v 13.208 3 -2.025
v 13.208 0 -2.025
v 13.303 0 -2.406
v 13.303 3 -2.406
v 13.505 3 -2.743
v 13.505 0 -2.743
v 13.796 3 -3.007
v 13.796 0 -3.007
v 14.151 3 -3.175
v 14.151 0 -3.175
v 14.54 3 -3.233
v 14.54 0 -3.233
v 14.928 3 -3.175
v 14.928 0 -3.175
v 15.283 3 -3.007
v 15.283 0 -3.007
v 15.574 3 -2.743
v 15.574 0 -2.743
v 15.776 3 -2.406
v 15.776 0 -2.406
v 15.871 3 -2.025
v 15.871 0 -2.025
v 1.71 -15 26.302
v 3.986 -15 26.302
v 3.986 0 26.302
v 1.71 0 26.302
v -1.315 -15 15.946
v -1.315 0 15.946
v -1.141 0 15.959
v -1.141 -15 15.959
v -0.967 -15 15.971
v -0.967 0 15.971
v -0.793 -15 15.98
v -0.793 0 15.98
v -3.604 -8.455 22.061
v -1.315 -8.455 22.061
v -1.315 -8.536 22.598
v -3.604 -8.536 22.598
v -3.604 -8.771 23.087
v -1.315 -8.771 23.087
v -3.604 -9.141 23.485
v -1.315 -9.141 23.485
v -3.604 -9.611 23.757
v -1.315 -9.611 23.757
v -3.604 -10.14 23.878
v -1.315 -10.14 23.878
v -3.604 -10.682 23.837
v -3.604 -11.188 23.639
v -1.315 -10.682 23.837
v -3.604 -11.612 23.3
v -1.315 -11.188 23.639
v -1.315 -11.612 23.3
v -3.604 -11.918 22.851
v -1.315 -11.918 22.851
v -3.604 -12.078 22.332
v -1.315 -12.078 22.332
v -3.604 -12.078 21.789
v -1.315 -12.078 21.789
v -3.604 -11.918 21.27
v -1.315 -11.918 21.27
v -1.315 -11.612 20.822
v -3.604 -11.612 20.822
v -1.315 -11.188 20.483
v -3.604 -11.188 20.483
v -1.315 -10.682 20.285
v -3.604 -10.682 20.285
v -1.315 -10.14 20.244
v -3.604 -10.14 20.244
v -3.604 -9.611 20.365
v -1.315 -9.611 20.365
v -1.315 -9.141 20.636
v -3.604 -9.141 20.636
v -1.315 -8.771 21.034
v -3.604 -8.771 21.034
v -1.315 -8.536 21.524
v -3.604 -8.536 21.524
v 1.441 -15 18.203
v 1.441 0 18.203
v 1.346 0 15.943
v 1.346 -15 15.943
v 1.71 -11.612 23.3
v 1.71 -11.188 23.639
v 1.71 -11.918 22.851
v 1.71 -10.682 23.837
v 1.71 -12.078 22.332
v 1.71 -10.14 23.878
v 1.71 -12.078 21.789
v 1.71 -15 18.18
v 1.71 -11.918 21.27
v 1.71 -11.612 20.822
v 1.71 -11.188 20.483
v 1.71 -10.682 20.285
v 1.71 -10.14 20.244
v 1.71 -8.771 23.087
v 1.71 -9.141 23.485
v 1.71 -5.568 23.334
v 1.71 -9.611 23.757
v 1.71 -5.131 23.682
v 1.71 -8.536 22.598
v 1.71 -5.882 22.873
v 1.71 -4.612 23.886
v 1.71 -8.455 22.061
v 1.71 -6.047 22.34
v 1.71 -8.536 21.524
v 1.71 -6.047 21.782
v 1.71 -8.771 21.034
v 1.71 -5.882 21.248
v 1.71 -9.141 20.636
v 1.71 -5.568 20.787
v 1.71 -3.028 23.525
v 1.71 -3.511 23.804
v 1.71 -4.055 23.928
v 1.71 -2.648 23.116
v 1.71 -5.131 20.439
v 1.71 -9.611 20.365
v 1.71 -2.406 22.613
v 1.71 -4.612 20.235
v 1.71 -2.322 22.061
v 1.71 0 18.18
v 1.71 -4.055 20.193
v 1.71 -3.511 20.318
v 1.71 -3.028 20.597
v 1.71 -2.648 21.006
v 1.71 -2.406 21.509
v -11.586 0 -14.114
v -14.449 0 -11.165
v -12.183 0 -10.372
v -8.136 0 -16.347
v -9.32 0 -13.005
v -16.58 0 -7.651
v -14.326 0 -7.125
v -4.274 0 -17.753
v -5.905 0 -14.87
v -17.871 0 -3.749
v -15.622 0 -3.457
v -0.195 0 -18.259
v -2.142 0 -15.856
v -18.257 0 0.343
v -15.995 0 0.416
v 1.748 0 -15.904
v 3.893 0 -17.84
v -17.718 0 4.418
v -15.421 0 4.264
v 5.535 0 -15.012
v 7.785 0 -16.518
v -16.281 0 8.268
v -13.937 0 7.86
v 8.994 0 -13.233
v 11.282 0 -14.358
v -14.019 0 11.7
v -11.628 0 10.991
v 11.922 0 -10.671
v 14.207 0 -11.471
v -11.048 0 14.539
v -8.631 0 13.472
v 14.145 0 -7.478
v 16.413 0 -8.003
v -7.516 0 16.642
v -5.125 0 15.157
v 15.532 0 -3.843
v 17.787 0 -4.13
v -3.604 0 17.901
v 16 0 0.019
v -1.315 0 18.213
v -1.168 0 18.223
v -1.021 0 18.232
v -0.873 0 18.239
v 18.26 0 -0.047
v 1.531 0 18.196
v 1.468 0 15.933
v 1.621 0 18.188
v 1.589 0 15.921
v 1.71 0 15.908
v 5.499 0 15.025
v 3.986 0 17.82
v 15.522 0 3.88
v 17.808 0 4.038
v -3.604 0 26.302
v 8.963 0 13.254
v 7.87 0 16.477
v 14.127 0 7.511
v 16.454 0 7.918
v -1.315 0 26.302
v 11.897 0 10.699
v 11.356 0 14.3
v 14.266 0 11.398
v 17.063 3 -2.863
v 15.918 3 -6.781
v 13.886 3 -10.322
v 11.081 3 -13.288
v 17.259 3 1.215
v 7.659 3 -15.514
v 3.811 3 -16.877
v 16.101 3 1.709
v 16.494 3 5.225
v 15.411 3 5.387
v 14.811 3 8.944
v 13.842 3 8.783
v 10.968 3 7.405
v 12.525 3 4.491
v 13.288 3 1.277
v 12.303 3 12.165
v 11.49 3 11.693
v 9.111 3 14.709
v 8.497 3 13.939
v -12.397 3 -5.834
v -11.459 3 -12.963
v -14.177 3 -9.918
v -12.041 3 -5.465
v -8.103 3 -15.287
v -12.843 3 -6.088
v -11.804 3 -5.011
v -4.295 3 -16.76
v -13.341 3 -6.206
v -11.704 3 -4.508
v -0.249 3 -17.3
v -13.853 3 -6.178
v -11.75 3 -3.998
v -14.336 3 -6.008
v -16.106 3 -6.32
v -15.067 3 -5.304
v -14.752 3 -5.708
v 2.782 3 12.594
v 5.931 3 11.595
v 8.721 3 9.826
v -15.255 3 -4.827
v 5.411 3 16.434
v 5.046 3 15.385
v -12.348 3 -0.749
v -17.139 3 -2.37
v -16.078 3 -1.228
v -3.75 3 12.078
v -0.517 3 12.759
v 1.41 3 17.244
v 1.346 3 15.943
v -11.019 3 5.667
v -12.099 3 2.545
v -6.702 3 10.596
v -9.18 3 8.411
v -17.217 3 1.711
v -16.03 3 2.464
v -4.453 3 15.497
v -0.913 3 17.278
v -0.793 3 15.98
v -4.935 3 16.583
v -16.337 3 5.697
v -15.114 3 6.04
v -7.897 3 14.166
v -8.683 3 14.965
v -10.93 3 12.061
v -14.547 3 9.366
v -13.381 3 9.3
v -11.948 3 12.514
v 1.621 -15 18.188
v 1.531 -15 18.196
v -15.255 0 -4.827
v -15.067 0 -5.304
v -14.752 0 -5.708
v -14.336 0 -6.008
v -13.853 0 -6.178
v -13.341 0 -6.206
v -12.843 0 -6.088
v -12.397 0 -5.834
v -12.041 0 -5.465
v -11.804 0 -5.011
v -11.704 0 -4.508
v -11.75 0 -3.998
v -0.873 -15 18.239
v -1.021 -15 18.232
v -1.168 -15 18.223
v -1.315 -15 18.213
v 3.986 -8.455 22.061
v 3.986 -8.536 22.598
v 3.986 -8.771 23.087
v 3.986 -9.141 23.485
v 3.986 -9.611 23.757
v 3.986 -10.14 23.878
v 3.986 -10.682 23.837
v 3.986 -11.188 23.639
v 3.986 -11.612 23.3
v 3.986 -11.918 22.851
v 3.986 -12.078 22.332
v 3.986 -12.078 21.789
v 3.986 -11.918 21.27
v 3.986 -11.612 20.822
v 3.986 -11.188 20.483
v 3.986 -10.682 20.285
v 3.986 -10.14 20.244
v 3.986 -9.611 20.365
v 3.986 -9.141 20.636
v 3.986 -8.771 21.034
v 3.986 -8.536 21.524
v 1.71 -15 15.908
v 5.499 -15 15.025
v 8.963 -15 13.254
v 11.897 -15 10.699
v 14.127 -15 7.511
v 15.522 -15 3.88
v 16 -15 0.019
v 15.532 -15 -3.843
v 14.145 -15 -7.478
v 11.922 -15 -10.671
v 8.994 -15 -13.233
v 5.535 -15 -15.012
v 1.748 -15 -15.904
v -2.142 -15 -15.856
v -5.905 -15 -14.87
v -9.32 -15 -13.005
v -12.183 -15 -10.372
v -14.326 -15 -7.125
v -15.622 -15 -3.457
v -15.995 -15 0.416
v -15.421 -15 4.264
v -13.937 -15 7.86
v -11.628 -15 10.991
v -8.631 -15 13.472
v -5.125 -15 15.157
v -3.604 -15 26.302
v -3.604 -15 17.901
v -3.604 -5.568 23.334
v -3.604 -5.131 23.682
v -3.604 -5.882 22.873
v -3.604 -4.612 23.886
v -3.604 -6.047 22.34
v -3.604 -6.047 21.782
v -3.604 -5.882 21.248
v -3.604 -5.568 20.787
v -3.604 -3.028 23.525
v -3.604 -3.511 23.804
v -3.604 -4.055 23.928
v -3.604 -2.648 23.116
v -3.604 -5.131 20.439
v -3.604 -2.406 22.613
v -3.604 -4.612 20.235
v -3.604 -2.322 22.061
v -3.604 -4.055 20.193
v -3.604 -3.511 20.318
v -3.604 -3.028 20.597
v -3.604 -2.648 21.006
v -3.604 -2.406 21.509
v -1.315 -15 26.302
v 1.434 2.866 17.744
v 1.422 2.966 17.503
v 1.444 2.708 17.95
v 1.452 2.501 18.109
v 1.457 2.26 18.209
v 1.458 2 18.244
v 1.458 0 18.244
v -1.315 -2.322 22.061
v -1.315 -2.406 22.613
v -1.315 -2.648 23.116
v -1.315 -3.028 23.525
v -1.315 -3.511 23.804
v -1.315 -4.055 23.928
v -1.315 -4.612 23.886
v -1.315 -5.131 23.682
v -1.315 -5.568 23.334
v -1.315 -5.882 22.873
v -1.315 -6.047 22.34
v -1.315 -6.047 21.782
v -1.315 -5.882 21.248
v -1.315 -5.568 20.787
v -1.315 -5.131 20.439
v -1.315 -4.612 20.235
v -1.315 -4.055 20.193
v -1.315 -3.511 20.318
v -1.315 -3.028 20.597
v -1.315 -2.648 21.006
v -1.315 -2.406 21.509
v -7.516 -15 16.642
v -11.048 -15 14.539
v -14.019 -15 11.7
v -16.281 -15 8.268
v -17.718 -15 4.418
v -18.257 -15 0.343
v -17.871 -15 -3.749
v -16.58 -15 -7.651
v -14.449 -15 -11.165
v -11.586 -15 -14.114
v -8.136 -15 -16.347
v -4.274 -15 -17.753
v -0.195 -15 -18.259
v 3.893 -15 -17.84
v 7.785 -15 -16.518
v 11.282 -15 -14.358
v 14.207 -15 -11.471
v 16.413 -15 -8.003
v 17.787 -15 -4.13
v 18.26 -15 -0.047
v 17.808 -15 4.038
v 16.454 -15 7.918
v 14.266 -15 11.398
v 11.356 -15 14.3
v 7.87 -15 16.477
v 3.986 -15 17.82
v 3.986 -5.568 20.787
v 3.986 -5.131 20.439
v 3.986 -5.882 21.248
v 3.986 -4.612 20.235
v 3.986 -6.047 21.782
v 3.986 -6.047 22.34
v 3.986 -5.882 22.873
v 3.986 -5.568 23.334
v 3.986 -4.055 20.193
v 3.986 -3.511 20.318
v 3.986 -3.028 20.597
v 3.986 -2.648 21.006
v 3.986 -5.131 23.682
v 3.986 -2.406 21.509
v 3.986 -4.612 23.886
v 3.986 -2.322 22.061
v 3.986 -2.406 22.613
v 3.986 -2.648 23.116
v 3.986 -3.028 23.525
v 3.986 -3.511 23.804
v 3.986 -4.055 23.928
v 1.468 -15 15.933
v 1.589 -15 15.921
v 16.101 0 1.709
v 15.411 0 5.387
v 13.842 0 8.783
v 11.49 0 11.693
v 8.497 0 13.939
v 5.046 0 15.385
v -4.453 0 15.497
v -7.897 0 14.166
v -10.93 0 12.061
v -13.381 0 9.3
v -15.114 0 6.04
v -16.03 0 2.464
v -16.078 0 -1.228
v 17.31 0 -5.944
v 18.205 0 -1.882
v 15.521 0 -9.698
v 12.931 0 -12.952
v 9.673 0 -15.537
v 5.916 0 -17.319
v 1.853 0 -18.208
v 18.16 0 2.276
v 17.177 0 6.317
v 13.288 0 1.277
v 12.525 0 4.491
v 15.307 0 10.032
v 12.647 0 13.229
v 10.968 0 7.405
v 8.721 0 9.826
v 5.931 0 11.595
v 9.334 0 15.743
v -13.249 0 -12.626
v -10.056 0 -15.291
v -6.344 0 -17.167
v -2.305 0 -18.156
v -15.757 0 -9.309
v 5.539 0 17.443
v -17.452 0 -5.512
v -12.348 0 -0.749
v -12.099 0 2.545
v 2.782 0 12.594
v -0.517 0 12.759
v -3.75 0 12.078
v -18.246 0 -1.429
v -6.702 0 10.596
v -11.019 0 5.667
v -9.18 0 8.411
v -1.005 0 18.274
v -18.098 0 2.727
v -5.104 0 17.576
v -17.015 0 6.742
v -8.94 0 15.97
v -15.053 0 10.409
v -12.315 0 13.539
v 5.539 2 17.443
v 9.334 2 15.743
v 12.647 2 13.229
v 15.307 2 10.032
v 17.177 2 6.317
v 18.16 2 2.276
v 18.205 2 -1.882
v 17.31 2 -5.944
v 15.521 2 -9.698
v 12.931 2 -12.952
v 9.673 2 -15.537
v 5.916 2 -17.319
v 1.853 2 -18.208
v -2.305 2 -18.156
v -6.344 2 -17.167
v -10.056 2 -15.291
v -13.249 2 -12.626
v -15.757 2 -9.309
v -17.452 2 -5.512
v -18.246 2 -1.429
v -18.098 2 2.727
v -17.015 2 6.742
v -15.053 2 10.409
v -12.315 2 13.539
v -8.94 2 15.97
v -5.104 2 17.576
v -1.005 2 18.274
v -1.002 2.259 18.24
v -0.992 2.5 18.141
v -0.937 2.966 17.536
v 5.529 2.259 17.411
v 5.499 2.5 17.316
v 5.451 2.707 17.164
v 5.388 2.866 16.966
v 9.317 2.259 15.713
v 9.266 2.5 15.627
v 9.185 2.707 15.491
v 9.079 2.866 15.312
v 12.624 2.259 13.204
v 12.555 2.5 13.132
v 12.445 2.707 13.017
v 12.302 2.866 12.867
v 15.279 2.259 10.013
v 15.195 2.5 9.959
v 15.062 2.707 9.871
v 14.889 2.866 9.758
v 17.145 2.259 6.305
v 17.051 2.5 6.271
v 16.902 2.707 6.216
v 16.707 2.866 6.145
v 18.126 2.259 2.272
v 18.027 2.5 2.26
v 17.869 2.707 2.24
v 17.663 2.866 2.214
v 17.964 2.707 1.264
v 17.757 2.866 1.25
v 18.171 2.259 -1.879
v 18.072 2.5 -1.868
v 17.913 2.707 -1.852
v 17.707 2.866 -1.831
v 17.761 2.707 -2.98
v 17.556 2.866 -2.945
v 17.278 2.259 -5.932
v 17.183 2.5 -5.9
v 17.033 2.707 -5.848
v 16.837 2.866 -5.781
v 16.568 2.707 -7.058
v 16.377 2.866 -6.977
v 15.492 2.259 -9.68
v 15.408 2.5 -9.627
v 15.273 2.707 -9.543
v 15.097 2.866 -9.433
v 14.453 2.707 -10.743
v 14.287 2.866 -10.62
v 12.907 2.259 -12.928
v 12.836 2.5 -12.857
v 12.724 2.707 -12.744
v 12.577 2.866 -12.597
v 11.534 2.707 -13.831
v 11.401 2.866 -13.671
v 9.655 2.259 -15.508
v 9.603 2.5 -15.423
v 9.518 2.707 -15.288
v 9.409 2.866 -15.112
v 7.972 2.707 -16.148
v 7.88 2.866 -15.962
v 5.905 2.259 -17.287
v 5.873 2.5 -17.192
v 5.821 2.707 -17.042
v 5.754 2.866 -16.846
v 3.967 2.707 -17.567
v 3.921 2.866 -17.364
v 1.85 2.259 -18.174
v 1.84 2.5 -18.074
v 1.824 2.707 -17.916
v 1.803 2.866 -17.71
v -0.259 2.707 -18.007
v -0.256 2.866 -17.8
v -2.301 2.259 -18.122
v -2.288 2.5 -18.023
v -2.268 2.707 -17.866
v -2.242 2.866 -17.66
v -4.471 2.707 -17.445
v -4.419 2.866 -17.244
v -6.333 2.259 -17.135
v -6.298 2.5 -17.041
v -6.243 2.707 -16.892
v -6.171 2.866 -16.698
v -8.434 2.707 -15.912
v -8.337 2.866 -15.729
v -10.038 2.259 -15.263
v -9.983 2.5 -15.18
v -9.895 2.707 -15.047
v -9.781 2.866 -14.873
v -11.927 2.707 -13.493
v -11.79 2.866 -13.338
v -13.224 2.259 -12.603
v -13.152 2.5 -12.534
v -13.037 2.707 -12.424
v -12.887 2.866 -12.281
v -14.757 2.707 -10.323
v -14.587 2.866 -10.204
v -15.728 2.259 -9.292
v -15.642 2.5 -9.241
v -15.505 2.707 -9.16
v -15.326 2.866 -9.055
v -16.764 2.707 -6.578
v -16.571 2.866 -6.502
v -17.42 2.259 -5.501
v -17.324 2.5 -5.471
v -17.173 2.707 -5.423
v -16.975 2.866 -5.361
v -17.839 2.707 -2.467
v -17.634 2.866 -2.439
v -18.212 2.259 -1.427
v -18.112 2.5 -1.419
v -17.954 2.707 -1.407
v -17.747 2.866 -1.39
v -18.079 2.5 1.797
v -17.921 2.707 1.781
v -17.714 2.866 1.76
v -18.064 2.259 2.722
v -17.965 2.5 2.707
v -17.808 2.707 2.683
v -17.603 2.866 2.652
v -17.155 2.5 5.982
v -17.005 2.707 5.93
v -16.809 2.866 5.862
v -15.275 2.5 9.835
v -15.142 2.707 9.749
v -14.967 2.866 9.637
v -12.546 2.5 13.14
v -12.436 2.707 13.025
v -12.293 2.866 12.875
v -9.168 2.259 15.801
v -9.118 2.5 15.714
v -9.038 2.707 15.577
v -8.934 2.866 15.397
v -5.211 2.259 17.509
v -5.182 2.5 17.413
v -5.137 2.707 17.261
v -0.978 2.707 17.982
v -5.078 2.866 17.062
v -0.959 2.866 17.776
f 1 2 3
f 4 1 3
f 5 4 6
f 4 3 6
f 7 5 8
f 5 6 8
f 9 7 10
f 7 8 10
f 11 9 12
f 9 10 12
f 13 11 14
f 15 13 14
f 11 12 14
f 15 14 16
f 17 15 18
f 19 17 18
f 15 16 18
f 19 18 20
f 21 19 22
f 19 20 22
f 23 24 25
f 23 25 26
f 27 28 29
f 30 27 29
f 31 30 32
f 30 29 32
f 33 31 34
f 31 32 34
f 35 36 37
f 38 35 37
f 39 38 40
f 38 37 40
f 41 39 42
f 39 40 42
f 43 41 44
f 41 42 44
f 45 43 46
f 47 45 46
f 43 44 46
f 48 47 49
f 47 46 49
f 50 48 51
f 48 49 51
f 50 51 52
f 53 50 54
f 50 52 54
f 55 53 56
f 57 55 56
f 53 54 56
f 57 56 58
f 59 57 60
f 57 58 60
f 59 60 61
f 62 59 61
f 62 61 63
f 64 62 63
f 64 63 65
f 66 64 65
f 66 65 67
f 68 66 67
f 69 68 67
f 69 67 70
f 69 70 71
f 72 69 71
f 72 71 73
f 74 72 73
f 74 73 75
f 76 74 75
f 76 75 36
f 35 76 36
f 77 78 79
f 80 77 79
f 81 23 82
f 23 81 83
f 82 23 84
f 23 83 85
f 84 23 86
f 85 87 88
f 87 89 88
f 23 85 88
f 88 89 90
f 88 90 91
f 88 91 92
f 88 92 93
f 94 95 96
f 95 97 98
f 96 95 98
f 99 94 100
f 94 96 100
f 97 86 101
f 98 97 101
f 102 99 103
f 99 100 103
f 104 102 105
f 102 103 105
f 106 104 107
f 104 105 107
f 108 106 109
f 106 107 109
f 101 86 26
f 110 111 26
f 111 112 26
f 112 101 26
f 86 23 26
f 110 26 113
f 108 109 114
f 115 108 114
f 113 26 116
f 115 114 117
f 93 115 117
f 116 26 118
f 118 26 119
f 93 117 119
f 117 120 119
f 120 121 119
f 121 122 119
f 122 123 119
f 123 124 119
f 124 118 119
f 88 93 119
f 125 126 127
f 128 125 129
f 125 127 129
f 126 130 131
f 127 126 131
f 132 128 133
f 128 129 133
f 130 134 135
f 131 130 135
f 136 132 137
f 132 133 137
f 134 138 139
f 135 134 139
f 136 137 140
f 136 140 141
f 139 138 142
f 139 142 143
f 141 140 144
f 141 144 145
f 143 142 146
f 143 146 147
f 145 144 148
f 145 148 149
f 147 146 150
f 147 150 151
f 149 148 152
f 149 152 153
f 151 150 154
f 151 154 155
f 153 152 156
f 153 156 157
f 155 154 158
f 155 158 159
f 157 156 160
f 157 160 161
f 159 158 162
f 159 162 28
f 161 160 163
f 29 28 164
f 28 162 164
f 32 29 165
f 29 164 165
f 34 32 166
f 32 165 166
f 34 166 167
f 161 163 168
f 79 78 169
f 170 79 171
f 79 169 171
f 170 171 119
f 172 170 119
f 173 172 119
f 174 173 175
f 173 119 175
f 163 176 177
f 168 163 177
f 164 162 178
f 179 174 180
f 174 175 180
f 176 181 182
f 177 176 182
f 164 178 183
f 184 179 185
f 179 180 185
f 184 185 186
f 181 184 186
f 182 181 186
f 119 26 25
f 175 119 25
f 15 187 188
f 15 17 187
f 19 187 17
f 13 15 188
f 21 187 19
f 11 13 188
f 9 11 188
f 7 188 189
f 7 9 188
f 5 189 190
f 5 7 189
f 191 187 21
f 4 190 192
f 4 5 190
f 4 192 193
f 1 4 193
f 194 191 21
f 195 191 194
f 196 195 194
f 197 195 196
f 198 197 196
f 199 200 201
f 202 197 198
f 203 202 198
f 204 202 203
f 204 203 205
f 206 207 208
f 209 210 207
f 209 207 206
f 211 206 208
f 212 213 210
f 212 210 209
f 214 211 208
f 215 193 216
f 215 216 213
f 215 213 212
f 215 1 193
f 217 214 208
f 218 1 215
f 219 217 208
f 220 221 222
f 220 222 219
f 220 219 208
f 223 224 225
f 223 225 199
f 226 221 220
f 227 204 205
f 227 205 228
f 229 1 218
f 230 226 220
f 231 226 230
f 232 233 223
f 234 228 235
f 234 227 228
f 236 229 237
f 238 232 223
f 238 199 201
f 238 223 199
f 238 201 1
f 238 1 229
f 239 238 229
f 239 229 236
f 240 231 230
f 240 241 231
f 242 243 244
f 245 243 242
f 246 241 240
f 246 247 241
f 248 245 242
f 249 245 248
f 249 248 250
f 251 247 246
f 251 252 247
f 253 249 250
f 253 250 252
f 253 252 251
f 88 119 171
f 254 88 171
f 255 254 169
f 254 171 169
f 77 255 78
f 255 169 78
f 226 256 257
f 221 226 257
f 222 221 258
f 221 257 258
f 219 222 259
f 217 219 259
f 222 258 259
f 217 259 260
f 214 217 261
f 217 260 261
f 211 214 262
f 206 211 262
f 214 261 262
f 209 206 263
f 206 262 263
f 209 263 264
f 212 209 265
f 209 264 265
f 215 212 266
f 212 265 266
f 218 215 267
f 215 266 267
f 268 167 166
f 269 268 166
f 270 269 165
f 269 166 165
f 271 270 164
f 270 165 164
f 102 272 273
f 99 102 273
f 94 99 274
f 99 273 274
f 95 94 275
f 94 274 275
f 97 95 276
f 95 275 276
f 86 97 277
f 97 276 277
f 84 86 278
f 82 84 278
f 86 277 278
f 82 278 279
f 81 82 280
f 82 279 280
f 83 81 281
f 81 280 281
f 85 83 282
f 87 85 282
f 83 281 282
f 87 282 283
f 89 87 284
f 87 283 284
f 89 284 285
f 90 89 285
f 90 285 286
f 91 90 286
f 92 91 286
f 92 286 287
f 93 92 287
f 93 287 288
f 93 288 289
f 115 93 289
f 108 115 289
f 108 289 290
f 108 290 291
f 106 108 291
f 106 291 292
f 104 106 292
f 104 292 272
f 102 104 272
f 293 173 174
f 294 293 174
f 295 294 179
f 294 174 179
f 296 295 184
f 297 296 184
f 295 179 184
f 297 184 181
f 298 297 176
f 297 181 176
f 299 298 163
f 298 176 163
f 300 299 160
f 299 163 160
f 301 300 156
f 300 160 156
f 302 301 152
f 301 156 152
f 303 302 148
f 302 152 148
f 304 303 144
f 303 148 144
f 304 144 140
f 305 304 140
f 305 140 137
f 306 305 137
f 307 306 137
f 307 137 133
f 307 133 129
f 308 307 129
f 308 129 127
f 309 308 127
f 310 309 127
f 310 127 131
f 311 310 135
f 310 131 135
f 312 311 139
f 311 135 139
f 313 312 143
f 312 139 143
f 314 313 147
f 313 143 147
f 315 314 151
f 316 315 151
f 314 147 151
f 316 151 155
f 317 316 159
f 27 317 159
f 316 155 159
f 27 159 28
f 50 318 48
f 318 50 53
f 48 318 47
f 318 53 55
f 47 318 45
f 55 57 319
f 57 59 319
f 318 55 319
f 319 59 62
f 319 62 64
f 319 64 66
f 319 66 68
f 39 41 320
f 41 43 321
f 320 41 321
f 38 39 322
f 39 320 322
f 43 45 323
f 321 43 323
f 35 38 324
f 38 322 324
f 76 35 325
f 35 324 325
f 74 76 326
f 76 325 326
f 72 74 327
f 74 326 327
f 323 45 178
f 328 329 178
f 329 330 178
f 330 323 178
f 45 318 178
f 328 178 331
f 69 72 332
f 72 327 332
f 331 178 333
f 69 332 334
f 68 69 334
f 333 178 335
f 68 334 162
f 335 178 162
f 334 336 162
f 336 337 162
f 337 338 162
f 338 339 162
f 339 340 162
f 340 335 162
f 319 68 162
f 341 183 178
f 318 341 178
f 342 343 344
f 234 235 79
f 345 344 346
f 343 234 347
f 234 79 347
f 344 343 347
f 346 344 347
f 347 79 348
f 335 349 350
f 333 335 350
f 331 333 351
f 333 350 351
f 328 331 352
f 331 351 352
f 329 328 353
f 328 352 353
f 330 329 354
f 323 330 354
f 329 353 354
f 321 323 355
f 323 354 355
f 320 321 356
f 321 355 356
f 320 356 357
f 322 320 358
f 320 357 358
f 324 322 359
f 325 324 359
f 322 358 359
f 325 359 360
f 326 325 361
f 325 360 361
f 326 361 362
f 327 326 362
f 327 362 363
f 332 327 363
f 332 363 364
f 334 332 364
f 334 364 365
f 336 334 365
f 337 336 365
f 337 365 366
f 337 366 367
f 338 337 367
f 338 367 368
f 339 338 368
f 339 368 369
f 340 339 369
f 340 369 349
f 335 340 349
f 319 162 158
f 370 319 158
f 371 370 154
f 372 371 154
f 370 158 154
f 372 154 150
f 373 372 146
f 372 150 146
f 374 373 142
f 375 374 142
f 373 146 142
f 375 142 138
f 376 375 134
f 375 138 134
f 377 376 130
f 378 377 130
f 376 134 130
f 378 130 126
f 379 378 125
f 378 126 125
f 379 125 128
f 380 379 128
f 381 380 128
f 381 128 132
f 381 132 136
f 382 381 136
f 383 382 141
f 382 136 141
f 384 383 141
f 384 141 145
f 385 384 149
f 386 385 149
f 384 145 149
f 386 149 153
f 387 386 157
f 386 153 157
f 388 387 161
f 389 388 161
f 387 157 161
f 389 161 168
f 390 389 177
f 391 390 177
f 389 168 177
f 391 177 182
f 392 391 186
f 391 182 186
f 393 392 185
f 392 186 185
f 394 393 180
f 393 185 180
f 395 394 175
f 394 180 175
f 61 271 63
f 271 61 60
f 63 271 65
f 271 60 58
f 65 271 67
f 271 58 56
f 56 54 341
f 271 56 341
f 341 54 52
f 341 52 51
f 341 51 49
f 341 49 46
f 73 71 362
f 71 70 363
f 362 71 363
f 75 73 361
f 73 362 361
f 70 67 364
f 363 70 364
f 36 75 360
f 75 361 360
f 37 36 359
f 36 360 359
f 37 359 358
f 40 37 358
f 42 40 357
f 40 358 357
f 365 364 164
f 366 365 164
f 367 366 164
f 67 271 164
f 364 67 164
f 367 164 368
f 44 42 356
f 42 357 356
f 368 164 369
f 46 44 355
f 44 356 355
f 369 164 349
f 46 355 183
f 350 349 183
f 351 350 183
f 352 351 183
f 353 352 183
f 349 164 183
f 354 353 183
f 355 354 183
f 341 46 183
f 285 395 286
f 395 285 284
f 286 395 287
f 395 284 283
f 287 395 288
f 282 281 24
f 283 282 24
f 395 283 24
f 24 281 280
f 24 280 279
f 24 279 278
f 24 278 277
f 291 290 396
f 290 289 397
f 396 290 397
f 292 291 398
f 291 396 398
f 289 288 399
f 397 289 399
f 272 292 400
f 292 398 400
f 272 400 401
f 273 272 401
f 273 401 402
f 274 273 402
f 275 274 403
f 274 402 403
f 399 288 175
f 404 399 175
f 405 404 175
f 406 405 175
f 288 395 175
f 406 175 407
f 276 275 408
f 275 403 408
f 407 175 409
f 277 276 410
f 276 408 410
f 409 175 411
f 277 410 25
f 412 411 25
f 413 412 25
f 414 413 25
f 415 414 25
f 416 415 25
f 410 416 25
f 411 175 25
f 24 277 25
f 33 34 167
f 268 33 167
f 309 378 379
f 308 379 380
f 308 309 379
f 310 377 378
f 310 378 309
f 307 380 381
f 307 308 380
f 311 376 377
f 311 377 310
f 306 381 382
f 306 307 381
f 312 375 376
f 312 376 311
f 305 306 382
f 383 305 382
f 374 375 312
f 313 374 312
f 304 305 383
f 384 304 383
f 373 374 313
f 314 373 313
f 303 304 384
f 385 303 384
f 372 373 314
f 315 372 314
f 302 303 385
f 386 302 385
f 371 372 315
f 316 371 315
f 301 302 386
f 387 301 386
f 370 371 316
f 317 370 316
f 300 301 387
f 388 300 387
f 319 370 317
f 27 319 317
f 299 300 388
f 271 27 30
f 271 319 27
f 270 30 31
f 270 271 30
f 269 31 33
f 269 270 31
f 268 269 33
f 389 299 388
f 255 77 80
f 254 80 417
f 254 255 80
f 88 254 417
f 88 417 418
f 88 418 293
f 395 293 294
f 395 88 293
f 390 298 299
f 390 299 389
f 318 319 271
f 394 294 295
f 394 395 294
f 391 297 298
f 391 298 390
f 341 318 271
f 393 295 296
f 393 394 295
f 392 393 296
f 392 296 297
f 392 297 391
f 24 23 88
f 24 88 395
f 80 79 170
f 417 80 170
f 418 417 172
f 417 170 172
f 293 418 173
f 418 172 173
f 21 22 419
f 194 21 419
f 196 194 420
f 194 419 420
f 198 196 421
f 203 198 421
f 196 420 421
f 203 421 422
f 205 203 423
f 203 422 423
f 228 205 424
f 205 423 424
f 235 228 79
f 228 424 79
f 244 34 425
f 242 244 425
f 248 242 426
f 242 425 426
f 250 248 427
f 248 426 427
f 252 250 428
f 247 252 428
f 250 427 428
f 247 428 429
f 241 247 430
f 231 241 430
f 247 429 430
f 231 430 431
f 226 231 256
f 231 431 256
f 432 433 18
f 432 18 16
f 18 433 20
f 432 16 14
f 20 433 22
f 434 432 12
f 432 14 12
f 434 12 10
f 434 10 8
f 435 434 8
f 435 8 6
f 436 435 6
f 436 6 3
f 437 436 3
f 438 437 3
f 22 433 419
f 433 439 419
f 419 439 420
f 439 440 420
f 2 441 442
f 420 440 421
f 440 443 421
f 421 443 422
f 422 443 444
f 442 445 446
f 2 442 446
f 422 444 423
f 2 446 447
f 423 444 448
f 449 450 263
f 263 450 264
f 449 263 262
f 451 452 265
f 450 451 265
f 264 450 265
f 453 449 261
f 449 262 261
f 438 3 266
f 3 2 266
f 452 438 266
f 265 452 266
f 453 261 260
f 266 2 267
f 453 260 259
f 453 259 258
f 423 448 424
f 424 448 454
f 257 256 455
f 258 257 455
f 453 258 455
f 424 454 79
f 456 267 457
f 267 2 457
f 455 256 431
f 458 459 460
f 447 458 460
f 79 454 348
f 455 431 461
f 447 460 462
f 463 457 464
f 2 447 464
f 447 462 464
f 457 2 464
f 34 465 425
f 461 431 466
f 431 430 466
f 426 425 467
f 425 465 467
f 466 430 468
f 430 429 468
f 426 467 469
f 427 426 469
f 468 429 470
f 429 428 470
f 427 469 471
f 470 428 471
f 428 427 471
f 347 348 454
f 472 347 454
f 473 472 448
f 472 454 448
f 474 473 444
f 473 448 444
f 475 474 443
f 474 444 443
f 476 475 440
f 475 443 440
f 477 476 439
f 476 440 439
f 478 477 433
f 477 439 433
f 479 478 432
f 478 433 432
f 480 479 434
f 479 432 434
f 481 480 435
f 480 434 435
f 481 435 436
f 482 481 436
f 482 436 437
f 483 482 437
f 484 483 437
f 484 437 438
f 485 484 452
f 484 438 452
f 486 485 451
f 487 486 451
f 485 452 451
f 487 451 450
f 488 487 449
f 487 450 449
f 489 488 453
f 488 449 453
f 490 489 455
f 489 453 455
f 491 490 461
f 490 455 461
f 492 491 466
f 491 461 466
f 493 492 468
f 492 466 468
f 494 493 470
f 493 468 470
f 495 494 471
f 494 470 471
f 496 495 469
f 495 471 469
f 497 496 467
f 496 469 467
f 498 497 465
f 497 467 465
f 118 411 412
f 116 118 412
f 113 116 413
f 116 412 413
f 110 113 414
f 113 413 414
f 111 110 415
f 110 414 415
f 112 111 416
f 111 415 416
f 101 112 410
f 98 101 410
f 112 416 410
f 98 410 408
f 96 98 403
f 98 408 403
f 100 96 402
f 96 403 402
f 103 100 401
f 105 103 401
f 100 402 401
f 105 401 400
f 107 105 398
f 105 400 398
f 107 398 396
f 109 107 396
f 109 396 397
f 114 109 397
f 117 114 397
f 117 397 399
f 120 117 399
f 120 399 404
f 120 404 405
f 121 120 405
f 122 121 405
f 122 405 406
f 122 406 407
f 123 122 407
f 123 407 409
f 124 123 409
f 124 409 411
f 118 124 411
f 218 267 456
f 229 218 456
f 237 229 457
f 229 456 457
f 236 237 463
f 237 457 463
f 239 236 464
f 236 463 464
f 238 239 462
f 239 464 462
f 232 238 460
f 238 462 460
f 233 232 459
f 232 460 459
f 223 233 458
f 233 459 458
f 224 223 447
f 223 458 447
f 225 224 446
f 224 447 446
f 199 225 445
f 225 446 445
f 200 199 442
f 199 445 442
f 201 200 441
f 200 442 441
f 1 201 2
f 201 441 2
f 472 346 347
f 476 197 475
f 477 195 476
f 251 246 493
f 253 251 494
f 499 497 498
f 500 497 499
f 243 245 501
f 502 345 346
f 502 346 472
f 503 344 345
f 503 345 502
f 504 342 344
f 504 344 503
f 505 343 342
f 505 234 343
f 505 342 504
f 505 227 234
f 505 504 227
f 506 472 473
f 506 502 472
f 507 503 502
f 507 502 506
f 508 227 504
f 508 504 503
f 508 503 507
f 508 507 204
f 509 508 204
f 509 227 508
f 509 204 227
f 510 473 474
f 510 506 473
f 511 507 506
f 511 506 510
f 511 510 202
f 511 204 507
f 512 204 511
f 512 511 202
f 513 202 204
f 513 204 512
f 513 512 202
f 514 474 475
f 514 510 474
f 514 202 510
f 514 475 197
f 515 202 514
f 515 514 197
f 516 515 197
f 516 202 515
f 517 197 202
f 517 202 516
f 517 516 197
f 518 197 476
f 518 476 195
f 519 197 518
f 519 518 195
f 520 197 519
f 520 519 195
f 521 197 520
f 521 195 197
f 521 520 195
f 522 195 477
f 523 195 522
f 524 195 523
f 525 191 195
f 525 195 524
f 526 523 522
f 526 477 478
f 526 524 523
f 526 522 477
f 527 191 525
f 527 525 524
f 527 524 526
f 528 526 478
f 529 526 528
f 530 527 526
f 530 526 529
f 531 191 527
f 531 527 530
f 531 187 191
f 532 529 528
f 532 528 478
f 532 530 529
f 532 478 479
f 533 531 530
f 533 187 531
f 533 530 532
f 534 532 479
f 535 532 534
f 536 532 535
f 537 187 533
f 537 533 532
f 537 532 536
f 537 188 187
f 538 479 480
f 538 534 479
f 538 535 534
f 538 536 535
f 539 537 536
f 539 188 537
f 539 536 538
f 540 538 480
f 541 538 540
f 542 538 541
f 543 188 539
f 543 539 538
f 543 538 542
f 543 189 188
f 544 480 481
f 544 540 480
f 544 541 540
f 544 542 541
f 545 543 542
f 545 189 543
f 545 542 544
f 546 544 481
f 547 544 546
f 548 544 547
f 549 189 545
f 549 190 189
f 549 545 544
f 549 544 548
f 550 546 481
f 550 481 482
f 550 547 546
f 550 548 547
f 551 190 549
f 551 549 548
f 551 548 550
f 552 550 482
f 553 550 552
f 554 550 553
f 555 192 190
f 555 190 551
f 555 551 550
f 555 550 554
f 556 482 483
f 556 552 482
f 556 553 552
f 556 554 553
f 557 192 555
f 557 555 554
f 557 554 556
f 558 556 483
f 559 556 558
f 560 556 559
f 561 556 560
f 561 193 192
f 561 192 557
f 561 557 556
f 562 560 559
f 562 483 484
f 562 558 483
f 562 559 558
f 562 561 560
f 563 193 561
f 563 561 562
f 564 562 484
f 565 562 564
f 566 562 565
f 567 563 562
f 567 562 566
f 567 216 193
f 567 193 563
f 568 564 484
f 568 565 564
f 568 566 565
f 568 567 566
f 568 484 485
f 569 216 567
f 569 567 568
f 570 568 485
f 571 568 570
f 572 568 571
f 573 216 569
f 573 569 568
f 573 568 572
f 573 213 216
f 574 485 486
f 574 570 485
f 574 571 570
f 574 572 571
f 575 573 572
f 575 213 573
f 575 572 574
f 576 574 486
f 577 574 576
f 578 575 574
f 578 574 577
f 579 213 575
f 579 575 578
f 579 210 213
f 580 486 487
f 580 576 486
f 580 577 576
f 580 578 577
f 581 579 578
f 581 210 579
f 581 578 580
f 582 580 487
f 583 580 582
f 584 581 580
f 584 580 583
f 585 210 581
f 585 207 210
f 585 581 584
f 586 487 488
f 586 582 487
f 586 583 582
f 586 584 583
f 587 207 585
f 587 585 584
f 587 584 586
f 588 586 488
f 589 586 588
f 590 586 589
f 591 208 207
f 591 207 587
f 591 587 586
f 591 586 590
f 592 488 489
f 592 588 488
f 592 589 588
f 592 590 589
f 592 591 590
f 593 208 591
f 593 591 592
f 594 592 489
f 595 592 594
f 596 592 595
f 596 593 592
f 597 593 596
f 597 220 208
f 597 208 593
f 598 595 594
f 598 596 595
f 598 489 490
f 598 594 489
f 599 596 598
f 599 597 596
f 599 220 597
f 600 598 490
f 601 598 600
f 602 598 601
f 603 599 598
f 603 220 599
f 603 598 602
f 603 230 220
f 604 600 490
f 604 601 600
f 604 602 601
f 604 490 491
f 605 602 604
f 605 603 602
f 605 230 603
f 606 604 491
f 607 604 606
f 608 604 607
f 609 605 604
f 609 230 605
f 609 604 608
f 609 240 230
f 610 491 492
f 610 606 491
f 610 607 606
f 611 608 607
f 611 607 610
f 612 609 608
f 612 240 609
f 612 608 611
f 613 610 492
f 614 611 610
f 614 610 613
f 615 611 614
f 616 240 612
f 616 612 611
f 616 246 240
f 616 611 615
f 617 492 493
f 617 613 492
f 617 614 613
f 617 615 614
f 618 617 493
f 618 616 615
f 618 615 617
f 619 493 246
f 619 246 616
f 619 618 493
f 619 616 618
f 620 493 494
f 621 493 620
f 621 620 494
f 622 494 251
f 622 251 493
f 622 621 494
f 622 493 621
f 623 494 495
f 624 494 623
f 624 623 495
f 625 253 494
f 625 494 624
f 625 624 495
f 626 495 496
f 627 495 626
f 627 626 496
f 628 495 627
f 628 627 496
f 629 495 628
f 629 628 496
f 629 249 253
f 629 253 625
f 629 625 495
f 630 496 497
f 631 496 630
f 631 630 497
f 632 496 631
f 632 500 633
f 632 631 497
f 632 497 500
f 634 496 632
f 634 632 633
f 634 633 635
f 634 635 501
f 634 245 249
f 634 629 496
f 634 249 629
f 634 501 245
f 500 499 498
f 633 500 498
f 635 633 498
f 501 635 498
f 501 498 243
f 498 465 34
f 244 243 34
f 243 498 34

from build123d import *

# Parameters (mm, degrees)
F1_DEPTH = 15
F3_DEPTH = 3
F4_R     = 1
F5_R     = 1.821901794
F5_R_2   = 1.8725831309
F6_DEPTH = 25


with BuildPart() as f1:
    # F0 (on Front) → F1 (new body)
    with BuildSketch(Plane.XZ):
        with BuildLine():
            ThreePointArc((-1.3153538917, 15.9458409668), (-1.0543071799, 15.9652258478), (-0.7929782714, 15.9803374639))
            Line((-0.7929782714, 15.9803374639), (-0.8730364945, 18.2393764119))
            ThreePointArc((-0.8730364945, 18.2393764119), (-1.0942757438, 18.2274409946), (-1.3153538917, 18.2128220975))
            Line((-1.3153538917, 18.2128220975), (-1.3153538917, 15.9458409668))
        make_face()
        with BuildLine():
            ThreePointArc((1.710430308, 15.9083131778), (-0.1984273858, -15.9987695331), (-1.3153538917, 15.9458409668))
            Line((-1.3153538917, 15.9458409668), (-3.6037638783, 15.9458409668))
            Line((-3.6037638783, 15.9458409668), (-3.6037638783, 17.901115343))
            ThreePointArc((-3.6037638783, 17.901115343), (-0.1952417623, -18.2592148043), (3.9857214978, 17.8199626475))
            Line((3.9857214978, 17.8199626475), (3.9857214978, 15.9083131778))
            Line((3.9857214978, 15.9083131778), (1.710430308, 15.9083131778))
        make_face()
        with BuildLine():
            Line((-3.6037638783, 15.9458409668), (-1.3153538917, 15.9458409668))
            Line((-1.3153538917, 15.9458409668), (-1.3153538917, 18.2128220975))
            ThreePointArc((-1.3153538917, 18.2128220975), (-2.4644918714, 18.0931844746), (-3.6037638783, 17.901115343))
            Line((-3.6037638783, 17.901115343), (-3.6037638783, 15.9458409668))
        make_face()
        with BuildLine():
            Line((1.710430308, 18.1799744988), (1.710430308, 15.9083131778))
            Line((1.710430308, 15.9083131778), (3.9857214978, 15.9083131778))
            Line((3.9857214978, 15.9083131778), (3.9857214978, 17.8199626475))
            ThreePointArc((3.9857214978, 17.8199626475), (2.8537586587, 18.0358838467), (1.710430308, 18.1799744988))
        make_face()
        with BuildLine():
            ThreePointArc((1.3463109011, 15.9432571), (1.5284704689, 15.926825736), (1.710430308, 15.9083131778))
            Line((1.710430308, 15.9083131778), (1.710430308, 18.1799744988))
            ThreePointArc((1.710430308, 18.1799744988), (1.5756035958, 18.1921553952), (1.4406902841, 18.2033364008))
            Line((1.4406902841, 18.2033364008), (1.3463109011, 15.9432571))
        make_face()
        with BuildLine():
            ThreePointArc((-3.6037638783, 17.901115343), (-2.4644918714, 18.0931844746), (-1.3153538917, 18.2128220975))
            Line((-1.3153538917, 18.2128220975), (-1.3153538917, 26.3016127771))
            Line((-1.3153538917, 26.3016127771), (-3.6037638783, 26.3016127771))
            Line((-3.6037638783, 26.3016127771), (-3.6037638783, 17.901115343))
        make_face()
        with BuildLine():
            Line((1.710430308, 26.3016127771), (1.710430308, 18.1799744988))
            ThreePointArc((1.710430308, 18.1799744988), (2.8537586587, 18.0358838467), (3.9857214978, 17.8199626475))
            Line((3.9857214978, 17.8199626475), (3.9857214978, 26.3016127771))
            Line((3.9857214978, 26.3016127771), (1.710430308, 26.3016127771))
        make_face()
    extrude(amount=F1_DEPTH)

    # F5 (on face) → F6 (cut)
    with BuildSketch(Plane.YZ.offset(3.9857214978)):
        with Locations((-10.2766146883, 22.0607877123)):
            Circle(F5_R)
        with Locations((-4.1950447485, 22.0607877123)):
            Circle(F5_R_2)
    extrude(amount=-F6_DEPTH, mode=Mode.SUBTRACT)


with BuildPart() as f3:
    # F2 (on face) → F3 (new body)
    with BuildSketch(Plane(origin=(0, 0, 0), x_dir=(-1, 0, 0), z_dir=(0, 1, 0))):
        with BuildLine():
            ThreePointArc((15.254548473, -4.8268779645), (13.0876587907, -6.1644776131), (11.7500591421, -3.9975879308))
            ThreePointArc((11.7500591421, -3.9975879308), (0.5173215514, 12.7592430058), (-13.2079693725, -2.0252815342))
            ThreePointArc((-13.2079693725, -2.0252815342), (-14.5396358049, -3.2329563244), (-15.8713022373, -2.0252815342))
            ThreePointArc((-15.8713022373, -2.0252815342), (-12.7555816036, 10.3110617982), (-1.3463109011, 15.9432571))
            Line((-1.3463109011, 15.9432571), (-1.4583122663, 18.2436864304))
            ThreePointArc((-1.4583122663, 18.2436864304), (0.2273298413, -18.3004669443), (1.0046831878, 18.2742819538))
            Line((1.0046831878, 18.2742819538), (0.7929782714, 15.9803374639))
            ThreePointArc((0.7929782714, 15.9803374639), (13.3814969398, 9.3004976117), (15.254548473, -4.8268779645))
        make_face()
    extrude(amount=F3_DEPTH)

    # F4
    f4_edges = [f3.edges().sort_by_distance(p)[0] for p in [
        (-0.22733, 3, -18.300467),
    ]]
    fillet(f4_edges, radius=F4_R)


solid = Compound([f1.part, f3.part])
